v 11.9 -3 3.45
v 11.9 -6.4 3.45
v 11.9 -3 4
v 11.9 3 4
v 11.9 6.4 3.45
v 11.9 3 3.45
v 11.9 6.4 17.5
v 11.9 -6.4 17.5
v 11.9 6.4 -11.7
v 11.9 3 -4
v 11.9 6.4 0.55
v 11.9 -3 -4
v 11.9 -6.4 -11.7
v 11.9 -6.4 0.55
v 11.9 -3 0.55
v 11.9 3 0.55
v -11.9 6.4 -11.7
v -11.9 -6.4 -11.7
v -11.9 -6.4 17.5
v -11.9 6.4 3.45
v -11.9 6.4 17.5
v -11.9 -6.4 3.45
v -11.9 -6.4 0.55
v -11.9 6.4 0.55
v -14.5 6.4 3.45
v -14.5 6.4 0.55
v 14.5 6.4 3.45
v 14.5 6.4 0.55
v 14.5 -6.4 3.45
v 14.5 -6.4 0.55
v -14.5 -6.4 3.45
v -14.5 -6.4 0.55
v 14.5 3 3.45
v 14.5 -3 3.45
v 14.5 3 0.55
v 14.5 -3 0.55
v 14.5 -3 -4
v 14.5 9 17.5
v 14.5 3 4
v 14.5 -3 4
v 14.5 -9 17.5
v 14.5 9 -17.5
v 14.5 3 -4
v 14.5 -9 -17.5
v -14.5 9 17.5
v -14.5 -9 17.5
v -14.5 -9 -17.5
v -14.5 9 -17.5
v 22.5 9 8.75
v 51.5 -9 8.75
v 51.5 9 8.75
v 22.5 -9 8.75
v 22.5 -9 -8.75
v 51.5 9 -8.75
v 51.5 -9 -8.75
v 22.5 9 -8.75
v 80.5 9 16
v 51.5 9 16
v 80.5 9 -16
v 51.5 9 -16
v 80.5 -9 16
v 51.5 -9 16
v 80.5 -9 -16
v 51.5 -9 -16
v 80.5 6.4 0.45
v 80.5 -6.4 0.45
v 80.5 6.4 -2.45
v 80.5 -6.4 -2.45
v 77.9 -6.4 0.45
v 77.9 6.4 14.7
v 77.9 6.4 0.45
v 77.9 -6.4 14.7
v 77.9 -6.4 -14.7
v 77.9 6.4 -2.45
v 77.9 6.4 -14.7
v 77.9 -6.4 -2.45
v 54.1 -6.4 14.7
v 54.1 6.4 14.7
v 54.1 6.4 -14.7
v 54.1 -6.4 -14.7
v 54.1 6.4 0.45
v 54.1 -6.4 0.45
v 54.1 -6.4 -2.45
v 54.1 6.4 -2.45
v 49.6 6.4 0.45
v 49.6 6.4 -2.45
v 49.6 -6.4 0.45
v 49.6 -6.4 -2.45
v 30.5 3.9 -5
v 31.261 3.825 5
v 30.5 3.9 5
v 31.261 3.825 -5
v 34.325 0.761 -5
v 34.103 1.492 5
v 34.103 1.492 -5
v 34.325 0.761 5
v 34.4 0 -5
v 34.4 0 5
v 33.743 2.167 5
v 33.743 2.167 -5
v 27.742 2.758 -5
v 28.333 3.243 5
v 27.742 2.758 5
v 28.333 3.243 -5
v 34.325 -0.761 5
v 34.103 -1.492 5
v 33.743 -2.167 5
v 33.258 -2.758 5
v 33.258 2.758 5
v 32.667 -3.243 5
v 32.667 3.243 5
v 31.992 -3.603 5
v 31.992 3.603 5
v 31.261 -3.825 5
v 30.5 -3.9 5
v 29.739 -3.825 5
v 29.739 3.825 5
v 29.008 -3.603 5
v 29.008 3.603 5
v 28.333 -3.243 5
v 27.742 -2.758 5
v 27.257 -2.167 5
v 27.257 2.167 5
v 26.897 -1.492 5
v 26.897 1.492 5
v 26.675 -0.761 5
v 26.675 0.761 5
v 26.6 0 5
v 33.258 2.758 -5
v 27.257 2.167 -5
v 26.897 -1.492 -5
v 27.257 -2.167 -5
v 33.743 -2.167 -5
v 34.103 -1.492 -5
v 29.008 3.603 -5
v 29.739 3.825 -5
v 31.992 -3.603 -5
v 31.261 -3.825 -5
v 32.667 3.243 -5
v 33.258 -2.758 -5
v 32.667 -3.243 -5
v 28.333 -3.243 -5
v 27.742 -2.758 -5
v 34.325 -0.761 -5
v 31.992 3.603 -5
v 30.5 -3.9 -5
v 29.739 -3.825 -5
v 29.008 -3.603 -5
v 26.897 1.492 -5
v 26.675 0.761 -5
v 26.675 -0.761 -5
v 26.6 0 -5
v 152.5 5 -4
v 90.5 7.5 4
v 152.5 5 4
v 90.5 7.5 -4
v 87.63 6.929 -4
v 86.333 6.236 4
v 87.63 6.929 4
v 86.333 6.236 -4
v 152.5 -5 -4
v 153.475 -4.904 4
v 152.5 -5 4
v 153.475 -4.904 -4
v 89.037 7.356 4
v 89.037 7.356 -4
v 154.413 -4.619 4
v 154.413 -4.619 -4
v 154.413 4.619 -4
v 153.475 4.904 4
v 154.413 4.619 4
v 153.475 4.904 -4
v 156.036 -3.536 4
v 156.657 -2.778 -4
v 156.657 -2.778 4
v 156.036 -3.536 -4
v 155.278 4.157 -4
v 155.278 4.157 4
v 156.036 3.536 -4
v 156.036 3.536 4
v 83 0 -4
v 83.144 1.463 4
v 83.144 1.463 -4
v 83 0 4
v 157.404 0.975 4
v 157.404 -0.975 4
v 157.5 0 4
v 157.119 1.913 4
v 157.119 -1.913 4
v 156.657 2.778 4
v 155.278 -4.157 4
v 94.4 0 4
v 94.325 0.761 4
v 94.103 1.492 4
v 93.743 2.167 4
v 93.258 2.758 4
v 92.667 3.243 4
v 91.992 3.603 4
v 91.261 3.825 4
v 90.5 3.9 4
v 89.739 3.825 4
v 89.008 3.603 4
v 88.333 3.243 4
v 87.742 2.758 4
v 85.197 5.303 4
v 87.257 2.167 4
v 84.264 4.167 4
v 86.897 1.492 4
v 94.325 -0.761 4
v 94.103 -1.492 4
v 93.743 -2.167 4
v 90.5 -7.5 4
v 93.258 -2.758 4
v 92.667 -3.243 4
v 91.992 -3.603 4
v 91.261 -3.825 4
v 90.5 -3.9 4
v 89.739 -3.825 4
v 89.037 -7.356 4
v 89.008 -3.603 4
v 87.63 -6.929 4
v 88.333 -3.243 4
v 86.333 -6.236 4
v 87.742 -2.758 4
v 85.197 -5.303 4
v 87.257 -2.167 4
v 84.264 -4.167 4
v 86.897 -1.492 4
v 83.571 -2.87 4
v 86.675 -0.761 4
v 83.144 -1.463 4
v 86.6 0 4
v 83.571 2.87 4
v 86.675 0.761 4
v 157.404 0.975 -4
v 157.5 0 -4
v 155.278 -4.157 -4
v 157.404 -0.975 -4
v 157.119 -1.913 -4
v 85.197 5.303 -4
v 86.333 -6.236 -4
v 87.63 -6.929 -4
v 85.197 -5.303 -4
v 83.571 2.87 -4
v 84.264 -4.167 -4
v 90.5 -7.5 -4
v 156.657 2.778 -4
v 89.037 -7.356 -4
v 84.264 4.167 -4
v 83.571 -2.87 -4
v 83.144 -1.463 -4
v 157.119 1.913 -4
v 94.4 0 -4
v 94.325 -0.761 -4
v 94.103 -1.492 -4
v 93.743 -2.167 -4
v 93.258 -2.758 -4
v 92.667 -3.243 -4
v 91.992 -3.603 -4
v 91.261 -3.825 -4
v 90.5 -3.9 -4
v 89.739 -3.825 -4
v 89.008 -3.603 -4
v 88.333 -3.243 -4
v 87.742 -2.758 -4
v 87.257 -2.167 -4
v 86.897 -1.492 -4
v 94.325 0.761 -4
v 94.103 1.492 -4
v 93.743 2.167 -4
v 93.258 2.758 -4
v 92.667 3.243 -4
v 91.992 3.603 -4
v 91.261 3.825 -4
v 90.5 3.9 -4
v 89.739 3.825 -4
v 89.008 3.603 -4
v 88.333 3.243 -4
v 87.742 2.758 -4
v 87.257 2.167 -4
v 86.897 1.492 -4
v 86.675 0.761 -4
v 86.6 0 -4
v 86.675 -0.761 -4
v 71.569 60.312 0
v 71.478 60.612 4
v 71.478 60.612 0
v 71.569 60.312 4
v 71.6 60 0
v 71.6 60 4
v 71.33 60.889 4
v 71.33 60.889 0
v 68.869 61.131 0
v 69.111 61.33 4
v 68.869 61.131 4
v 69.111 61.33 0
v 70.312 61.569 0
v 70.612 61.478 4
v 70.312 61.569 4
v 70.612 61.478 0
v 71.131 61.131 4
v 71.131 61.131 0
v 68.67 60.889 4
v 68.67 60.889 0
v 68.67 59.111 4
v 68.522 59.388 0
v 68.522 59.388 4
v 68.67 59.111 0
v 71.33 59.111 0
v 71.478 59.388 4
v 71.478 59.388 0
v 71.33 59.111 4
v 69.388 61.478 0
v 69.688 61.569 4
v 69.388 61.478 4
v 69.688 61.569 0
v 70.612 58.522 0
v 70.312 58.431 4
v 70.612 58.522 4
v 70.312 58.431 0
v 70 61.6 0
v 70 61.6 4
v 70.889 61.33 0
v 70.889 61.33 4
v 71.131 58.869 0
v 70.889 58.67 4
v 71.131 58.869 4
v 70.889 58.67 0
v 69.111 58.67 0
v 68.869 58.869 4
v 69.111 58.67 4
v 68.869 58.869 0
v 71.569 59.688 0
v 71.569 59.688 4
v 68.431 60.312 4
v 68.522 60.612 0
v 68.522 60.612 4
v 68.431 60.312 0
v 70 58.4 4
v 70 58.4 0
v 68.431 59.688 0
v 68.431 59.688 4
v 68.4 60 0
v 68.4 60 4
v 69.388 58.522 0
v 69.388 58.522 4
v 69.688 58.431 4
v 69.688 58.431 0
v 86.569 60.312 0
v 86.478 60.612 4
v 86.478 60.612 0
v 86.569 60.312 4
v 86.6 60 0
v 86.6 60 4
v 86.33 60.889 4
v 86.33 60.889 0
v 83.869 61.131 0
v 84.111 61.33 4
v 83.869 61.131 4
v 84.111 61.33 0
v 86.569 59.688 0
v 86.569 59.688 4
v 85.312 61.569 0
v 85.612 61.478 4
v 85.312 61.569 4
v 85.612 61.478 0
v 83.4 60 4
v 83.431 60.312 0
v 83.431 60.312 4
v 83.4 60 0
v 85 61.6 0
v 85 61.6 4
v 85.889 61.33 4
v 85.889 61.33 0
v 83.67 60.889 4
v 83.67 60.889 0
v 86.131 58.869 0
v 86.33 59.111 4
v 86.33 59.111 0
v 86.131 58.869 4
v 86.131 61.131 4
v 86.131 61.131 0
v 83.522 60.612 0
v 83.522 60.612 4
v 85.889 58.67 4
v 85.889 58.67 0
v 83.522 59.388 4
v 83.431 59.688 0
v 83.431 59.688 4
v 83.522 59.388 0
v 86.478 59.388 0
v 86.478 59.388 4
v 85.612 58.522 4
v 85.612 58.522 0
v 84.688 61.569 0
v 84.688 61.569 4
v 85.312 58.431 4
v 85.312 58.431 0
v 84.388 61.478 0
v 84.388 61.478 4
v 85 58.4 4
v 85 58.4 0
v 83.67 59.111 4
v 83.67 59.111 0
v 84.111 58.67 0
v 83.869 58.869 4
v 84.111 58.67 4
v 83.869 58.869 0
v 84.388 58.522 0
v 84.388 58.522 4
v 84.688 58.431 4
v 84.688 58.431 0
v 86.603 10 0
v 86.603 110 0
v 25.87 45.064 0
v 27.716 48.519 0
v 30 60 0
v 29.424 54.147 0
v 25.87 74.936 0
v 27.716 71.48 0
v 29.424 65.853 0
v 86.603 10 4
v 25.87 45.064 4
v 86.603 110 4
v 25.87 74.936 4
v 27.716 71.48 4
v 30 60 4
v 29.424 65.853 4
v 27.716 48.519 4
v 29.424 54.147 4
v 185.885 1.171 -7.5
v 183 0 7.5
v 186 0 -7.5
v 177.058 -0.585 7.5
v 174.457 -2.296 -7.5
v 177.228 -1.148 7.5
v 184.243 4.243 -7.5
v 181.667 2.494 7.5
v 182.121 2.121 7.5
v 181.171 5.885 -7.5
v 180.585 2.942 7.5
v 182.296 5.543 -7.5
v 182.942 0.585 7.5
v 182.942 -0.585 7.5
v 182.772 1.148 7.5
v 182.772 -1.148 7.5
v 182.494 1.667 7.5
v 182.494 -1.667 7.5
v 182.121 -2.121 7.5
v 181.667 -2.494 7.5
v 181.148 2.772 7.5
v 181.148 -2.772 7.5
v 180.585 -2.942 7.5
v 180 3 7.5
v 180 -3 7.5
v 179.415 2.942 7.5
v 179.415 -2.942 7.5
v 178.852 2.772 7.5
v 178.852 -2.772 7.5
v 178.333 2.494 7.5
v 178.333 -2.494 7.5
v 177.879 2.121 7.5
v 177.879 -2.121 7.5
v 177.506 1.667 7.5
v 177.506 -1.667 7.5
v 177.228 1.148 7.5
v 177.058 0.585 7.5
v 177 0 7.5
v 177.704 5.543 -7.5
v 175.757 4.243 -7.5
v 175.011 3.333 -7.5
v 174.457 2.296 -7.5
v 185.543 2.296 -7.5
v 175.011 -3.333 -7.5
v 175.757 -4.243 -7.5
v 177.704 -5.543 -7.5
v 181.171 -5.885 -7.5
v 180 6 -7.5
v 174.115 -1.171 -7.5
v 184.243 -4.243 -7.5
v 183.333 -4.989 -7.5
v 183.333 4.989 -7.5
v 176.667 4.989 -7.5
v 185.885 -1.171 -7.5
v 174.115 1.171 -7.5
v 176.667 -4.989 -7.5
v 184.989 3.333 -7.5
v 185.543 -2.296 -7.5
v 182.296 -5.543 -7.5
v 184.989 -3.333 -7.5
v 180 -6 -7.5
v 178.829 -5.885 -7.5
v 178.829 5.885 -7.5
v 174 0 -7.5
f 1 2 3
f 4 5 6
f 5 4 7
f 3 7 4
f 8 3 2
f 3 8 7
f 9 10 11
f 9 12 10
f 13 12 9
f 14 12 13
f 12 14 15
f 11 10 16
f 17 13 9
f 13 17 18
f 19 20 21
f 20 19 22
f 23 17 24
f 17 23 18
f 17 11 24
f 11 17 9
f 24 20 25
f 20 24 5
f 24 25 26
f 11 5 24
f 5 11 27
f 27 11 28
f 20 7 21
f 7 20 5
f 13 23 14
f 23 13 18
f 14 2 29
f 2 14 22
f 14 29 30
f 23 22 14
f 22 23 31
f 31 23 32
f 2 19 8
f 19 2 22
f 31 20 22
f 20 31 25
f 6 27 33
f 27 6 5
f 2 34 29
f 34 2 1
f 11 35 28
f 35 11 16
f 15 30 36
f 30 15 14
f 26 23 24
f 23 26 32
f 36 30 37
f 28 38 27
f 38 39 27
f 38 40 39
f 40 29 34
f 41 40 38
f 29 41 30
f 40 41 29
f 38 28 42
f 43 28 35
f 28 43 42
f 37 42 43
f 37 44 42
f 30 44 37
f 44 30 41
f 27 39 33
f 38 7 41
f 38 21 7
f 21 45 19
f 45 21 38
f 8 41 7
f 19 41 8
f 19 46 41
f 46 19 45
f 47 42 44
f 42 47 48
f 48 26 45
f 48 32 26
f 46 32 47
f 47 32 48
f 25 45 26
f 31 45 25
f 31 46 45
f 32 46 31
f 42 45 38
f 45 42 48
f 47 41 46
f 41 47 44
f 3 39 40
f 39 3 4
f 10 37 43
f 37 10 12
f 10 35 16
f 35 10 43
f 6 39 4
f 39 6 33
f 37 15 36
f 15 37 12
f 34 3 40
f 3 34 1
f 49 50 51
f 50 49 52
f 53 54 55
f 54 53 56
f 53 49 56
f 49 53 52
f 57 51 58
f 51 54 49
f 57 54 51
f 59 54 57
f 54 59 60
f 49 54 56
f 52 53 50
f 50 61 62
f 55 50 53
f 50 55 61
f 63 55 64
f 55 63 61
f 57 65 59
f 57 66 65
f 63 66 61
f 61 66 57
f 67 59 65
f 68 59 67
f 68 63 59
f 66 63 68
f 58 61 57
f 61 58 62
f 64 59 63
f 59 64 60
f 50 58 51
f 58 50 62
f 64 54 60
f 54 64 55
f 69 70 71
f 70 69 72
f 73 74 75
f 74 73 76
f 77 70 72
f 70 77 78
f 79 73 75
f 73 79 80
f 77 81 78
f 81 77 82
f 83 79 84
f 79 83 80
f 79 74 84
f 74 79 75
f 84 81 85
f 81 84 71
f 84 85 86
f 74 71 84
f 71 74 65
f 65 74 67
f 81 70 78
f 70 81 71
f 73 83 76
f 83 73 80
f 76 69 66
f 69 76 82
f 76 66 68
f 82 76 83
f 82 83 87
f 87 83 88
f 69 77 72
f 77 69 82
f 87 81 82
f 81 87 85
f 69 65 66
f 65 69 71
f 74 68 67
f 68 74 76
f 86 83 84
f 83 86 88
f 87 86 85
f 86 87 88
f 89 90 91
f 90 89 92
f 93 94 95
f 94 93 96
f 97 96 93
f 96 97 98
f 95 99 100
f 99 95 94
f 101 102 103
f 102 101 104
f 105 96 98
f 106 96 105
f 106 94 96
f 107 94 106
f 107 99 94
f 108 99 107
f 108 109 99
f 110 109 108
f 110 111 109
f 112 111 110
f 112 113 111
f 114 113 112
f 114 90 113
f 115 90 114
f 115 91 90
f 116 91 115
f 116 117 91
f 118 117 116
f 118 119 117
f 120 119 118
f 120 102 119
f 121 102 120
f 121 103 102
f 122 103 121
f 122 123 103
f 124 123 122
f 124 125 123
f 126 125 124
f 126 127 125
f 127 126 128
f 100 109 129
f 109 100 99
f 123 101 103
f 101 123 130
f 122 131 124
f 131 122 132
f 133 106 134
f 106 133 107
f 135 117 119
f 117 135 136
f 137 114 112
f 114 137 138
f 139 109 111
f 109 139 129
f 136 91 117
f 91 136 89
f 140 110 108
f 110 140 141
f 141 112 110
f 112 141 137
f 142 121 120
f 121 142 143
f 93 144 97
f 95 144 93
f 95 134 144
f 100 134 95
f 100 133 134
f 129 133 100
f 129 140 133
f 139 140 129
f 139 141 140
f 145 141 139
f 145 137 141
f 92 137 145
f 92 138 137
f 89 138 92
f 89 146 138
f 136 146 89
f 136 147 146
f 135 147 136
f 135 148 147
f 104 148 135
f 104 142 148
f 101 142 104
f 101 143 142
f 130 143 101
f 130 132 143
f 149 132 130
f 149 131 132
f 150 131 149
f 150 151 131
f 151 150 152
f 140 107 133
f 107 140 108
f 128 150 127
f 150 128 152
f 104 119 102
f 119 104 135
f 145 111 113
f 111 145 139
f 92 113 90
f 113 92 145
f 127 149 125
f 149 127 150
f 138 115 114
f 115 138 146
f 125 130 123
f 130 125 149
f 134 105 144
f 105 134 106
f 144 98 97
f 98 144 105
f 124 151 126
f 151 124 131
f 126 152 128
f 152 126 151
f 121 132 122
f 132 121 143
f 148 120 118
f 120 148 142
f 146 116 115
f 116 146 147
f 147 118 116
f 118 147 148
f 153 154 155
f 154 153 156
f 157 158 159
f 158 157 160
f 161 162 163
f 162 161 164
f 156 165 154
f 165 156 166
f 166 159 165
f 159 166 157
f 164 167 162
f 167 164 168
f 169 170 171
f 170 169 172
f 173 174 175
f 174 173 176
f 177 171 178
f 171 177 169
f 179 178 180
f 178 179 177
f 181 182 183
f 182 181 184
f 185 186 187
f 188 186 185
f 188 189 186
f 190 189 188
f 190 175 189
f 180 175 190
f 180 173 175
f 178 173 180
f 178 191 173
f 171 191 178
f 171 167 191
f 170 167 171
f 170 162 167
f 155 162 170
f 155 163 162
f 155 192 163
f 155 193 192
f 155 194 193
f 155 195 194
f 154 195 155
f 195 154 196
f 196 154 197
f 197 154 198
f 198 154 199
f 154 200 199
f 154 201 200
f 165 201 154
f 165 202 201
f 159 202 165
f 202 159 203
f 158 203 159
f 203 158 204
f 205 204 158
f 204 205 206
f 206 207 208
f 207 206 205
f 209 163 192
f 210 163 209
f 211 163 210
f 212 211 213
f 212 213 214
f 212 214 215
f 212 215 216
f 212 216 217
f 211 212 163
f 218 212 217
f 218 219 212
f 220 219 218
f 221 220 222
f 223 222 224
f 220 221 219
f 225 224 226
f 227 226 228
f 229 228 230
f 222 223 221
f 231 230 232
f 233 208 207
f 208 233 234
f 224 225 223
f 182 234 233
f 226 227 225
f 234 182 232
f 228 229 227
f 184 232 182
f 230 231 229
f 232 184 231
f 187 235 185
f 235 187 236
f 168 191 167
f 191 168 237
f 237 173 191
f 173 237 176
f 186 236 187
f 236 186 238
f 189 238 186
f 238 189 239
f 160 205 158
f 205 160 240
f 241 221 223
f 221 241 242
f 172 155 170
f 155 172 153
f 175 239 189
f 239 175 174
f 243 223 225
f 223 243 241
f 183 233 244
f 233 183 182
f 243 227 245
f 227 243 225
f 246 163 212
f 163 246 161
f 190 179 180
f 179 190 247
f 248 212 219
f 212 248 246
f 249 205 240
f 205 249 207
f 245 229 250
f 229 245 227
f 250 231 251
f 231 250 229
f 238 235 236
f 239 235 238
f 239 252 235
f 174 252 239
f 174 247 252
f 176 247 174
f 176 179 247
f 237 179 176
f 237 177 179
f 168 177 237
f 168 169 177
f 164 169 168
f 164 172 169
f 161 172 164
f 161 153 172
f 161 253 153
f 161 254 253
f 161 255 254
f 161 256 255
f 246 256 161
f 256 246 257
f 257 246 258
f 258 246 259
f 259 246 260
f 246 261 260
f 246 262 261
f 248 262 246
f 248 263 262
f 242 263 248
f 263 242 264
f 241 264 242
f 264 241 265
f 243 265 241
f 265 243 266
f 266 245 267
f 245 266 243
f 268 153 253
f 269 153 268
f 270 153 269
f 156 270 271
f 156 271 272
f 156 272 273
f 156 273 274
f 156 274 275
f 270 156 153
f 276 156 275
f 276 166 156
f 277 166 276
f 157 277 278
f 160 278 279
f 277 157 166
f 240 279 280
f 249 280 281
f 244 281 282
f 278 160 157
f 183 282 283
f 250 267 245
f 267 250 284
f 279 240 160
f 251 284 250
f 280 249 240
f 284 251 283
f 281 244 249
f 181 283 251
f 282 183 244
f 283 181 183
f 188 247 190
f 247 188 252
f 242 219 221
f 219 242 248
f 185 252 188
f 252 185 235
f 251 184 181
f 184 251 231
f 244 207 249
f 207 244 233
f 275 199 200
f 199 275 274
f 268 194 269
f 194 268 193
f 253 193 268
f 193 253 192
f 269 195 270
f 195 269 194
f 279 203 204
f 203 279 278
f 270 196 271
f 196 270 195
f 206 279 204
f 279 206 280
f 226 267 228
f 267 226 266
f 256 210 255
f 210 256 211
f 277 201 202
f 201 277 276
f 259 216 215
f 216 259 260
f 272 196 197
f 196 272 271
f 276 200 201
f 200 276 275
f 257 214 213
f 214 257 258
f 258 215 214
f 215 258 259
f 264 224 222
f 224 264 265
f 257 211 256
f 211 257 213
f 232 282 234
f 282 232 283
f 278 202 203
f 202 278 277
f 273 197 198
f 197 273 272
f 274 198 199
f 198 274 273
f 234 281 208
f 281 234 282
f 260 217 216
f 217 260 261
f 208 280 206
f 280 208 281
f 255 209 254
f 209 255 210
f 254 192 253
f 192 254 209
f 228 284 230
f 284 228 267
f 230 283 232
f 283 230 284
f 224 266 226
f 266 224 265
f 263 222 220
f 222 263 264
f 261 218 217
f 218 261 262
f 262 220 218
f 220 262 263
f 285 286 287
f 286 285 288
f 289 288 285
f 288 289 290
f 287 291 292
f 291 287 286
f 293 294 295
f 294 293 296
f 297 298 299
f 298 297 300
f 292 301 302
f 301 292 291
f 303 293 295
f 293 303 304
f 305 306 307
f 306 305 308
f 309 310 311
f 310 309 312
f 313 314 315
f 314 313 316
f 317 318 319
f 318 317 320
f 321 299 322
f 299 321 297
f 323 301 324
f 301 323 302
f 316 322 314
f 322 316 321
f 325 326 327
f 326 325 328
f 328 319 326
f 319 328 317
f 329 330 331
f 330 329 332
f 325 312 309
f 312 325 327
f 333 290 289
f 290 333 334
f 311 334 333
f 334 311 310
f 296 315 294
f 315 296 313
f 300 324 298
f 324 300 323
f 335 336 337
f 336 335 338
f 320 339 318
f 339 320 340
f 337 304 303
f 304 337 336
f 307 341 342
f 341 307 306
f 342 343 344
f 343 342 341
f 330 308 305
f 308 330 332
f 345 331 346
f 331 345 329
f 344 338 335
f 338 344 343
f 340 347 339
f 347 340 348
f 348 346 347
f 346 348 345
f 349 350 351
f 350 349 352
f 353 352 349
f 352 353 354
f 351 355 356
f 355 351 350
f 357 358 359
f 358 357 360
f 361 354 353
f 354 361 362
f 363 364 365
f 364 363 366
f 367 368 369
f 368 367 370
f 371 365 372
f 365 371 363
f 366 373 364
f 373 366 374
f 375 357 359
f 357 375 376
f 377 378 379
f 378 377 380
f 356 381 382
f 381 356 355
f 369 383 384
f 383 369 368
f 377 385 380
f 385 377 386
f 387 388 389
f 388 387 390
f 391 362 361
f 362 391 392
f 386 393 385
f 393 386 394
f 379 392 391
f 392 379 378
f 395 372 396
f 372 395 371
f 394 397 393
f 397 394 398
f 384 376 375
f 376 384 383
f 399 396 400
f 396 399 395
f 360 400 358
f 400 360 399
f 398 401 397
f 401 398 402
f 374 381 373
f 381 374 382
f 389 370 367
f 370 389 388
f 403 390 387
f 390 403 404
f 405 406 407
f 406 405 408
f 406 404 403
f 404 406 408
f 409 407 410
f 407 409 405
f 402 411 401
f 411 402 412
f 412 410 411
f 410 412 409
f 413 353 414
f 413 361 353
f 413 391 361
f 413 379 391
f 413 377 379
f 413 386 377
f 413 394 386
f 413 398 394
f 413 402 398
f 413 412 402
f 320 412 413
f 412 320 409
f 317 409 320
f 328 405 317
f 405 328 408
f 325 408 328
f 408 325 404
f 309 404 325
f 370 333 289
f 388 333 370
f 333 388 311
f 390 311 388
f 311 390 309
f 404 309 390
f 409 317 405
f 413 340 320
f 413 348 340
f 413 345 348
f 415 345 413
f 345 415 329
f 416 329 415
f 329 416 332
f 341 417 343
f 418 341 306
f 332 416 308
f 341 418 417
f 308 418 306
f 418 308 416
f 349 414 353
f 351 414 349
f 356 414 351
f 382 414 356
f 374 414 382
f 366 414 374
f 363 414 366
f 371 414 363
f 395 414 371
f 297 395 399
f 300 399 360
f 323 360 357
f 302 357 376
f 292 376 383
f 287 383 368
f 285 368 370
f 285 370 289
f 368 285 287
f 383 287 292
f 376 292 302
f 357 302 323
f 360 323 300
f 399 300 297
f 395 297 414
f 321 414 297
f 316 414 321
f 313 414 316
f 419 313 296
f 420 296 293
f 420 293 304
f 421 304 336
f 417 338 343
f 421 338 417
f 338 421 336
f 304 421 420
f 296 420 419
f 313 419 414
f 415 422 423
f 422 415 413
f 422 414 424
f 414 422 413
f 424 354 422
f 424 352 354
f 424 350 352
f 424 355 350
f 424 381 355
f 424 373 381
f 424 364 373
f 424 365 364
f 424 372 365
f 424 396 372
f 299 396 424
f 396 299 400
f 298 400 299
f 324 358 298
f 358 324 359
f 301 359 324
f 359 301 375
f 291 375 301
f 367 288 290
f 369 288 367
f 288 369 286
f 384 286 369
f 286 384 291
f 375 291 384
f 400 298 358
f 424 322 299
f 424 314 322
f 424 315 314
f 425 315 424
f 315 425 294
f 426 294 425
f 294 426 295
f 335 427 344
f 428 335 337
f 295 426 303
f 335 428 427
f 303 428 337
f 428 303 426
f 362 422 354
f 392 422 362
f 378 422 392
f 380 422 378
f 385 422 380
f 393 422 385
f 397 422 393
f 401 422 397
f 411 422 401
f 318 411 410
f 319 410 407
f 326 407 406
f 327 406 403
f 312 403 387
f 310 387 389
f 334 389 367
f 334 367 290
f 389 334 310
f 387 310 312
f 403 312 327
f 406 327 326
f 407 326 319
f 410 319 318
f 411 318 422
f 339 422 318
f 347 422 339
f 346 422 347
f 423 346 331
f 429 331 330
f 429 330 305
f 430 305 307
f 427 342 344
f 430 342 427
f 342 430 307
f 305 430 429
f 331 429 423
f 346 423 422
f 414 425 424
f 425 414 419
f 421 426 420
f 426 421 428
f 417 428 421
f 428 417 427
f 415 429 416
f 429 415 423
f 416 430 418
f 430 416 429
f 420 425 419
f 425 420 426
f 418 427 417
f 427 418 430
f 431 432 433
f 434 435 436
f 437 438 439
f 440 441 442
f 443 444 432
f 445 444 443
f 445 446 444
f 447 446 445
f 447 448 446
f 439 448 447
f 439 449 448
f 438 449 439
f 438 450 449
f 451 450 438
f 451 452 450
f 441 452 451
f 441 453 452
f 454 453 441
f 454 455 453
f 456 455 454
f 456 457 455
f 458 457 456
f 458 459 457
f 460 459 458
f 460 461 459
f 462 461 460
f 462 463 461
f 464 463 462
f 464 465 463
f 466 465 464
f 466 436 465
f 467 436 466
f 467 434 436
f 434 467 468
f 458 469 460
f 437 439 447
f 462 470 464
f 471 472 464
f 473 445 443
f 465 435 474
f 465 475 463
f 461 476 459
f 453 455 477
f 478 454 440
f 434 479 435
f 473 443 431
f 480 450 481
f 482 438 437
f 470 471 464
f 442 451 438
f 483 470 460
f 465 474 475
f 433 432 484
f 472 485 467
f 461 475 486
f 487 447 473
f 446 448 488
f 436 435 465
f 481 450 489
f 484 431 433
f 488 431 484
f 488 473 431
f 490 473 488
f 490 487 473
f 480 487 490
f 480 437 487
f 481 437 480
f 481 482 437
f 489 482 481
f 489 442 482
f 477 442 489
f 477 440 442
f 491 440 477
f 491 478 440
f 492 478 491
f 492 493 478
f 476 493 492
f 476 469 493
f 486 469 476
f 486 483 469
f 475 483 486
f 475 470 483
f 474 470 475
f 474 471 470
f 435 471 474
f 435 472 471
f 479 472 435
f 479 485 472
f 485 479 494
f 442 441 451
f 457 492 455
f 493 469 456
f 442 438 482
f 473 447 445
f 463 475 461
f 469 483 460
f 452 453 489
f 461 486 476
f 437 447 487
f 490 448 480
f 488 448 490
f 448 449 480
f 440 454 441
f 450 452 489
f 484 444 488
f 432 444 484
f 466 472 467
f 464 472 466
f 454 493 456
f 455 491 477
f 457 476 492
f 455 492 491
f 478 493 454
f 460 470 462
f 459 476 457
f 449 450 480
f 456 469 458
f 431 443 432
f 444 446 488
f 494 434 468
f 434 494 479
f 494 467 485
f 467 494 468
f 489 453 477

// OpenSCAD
// file: leg.scad
// Hexapod Leg - Parametric OpenSCAD Design
// Designed for SG90 servos (all 18 joints)

/* [Servo Dimensions] */
// SG90 micro servo
sg90_width = 12;
sg90_length = 23;
sg90_height = 29;
sg90_shaft_height = 4;
sg90_ear_width = 32;
sg90_ear_thickness = 2.5;
sg90_ear_offset = 15.5;  // from bottom

// HS-82MG servo (slightly larger)
hs82_width = 12;
hs82_length = 30;
hs82_height = 30;
hs82_shaft_height = 4;
hs82_ear_width = 40;
hs82_ear_thickness = 2.5;
hs82_ear_offset = 17;

/* [Leg Dimensions] */
coxa_length = 25;
femur_length = 55;
tibia_length = 75;
wall_thickness = 3;
clearance = 0.4;  // printer tolerance (increased for MG90S compatibility)

/* [Rendering] */
$fn = 32;

// Servo pocket module (for embedding servo)
module servo_pocket(type="sg90") {
    w = (type == "sg90") ? sg90_width : hs82_width;
    l = (type == "sg90") ? sg90_length : hs82_length;
    h = (type == "sg90") ? sg90_height : hs82_height;
    ear_w = (type == "sg90") ? sg90_ear_width : hs82_ear_width;
    ear_t = (type == "sg90") ? sg90_ear_thickness : hs82_ear_thickness;
    ear_off = (type == "sg90") ? sg90_ear_offset : hs82_ear_offset;

    c = clearance;

    union() {
        // Main body
        cube([l + c*2, w + c*2, h + c], center=true);
        // Mounting ears
        translate([0, 0, h/2 - ear_off])
            cube([ear_w + c*2, w + c*2, ear_t + c], center=true);
    }
}

// Horn/shaft hole
module shaft_hole(d=7, h=10) {
    cylinder(d=d + clearance*2, h=h, center=true);
}

// Coxa bracket - mounts SG90 for hip rotation
module coxa_bracket() {
    bracket_h = sg90_height + wall_thickness * 2;
    bracket_w = sg90_width + wall_thickness * 2;
    bracket_l = sg90_length + wall_thickness * 2;

    difference() {
        // Outer shell
        cube([bracket_l, bracket_w, bracket_h], center=true);

        // Servo pocket
        translate([0, 0, wall_thickness])
            servo_pocket("sg90");

        // Shaft hole (top)
        translate([0, 0, bracket_h/2 - 2])
            shaft_hole();

        // Wire channel
        translate([bracket_l/2, 0, 0])
            cube([wall_thickness*2, 6, 8], center=true);
    }
}

// Femur link - connects coxa to tibia
module femur_link() {
    link_w = sg90_width + wall_thickness * 2;
    link_h = sg90_height/2 + wall_thickness;

    difference() {
        union() {
            // Main beam
            cube([femur_length, link_w, link_h], center=true);

            // Servo mount end
            translate([femur_length/2 - sg90_length/2, 0, 0])
                cube([sg90_length + wall_thickness*2, link_w, sg90_height + wall_thickness], center=true);
        }

        // Servo pocket at end
        translate([femur_length/2 - sg90_length/2, 0, 0])
            servo_pocket("sg90");

        // Horn attachment hole (other end)
        translate([-femur_length/2 + 8, 0, 0])
            shaft_hole();
    }
}

// Tibia link - lower leg segment
module tibia_link() {
    link_w = 15;
    link_h = 8;

    difference() {
        union() {
            // Main beam
            hull() {
                translate([-tibia_length/2 + 8, 0, 0])
                    cylinder(d=link_w, h=link_h, center=true);
                translate([tibia_length/2 - 5, 0, 0])
                    cylinder(d=10, h=link_h, center=true);
            }
        }

        // Horn attachment hole
        translate([-tibia_length/2 + 8, 0, 0])
            shaft_hole();
    }
}

// Foot tip (print in TPU for grip)
module foot_tip() {
    cylinder(d1=12, d2=6, h=15, center=true);
}

// Body mount plate (1/6 segment)
module body_segment() {
    seg_angle = 60;
    inner_r = 30;
    outer_r = 100;
    thickness = 4;

    difference() {
        // Wedge shape
        linear_extrude(height=thickness)
            polygon([
                [0, 0],
                [outer_r * cos(seg_angle/2), outer_r * sin(seg_angle/2)],
                [outer_r * cos(-seg_angle/2), outer_r * sin(-seg_angle/2)]
            ]);

        // Inner cutout
        translate([0, 0, -1])
            cylinder(r=inner_r, h=thickness+2);

        // Coxa mount holes
        translate([70, 0, -1]) {
            cylinder(d=3.2, h=thickness+2);
            translate([15, 0, 0])
                cylinder(d=3.2, h=thickness+2);
        }
    }
}

// Preview all parts
module preview() {
    color("DarkGray") coxa_bracket();
    color("Gray") translate([50, 0, 0]) femur_link();
    color("LightGray") translate([120, 0, 0]) tibia_link();
    color("Black") translate([180, 0, 0]) foot_tip();
    color("Blue", 0.5) translate([0, 60, 0]) body_segment();
}

// Uncomment to render individual parts for printing:
// coxa_bracket();
// femur_link();
// tibia_link();
// foot_tip();
// body_segment();

preview();
// main file
// Export individual parts for 3D printing
// Usage: openscad -o stl/part.stl -D 'PART="coxa_bracket"' export_parts.scad

include <leg.scad>

PART = "preview";  // Options: coxa_bracket, femur_link, tibia_link, foot_tip, body_segment

if (PART == "coxa_bracket") {
    coxa_bracket();
} else if (PART == "femur_link") {
    femur_link();
} else if (PART == "tibia_link") {
    tibia_link();
} else if (PART == "foot_tip") {
    foot_tip();
} else if (PART == "body_segment") {
    body_segment();
} else {
    // Preview all parts
    preview();
}
